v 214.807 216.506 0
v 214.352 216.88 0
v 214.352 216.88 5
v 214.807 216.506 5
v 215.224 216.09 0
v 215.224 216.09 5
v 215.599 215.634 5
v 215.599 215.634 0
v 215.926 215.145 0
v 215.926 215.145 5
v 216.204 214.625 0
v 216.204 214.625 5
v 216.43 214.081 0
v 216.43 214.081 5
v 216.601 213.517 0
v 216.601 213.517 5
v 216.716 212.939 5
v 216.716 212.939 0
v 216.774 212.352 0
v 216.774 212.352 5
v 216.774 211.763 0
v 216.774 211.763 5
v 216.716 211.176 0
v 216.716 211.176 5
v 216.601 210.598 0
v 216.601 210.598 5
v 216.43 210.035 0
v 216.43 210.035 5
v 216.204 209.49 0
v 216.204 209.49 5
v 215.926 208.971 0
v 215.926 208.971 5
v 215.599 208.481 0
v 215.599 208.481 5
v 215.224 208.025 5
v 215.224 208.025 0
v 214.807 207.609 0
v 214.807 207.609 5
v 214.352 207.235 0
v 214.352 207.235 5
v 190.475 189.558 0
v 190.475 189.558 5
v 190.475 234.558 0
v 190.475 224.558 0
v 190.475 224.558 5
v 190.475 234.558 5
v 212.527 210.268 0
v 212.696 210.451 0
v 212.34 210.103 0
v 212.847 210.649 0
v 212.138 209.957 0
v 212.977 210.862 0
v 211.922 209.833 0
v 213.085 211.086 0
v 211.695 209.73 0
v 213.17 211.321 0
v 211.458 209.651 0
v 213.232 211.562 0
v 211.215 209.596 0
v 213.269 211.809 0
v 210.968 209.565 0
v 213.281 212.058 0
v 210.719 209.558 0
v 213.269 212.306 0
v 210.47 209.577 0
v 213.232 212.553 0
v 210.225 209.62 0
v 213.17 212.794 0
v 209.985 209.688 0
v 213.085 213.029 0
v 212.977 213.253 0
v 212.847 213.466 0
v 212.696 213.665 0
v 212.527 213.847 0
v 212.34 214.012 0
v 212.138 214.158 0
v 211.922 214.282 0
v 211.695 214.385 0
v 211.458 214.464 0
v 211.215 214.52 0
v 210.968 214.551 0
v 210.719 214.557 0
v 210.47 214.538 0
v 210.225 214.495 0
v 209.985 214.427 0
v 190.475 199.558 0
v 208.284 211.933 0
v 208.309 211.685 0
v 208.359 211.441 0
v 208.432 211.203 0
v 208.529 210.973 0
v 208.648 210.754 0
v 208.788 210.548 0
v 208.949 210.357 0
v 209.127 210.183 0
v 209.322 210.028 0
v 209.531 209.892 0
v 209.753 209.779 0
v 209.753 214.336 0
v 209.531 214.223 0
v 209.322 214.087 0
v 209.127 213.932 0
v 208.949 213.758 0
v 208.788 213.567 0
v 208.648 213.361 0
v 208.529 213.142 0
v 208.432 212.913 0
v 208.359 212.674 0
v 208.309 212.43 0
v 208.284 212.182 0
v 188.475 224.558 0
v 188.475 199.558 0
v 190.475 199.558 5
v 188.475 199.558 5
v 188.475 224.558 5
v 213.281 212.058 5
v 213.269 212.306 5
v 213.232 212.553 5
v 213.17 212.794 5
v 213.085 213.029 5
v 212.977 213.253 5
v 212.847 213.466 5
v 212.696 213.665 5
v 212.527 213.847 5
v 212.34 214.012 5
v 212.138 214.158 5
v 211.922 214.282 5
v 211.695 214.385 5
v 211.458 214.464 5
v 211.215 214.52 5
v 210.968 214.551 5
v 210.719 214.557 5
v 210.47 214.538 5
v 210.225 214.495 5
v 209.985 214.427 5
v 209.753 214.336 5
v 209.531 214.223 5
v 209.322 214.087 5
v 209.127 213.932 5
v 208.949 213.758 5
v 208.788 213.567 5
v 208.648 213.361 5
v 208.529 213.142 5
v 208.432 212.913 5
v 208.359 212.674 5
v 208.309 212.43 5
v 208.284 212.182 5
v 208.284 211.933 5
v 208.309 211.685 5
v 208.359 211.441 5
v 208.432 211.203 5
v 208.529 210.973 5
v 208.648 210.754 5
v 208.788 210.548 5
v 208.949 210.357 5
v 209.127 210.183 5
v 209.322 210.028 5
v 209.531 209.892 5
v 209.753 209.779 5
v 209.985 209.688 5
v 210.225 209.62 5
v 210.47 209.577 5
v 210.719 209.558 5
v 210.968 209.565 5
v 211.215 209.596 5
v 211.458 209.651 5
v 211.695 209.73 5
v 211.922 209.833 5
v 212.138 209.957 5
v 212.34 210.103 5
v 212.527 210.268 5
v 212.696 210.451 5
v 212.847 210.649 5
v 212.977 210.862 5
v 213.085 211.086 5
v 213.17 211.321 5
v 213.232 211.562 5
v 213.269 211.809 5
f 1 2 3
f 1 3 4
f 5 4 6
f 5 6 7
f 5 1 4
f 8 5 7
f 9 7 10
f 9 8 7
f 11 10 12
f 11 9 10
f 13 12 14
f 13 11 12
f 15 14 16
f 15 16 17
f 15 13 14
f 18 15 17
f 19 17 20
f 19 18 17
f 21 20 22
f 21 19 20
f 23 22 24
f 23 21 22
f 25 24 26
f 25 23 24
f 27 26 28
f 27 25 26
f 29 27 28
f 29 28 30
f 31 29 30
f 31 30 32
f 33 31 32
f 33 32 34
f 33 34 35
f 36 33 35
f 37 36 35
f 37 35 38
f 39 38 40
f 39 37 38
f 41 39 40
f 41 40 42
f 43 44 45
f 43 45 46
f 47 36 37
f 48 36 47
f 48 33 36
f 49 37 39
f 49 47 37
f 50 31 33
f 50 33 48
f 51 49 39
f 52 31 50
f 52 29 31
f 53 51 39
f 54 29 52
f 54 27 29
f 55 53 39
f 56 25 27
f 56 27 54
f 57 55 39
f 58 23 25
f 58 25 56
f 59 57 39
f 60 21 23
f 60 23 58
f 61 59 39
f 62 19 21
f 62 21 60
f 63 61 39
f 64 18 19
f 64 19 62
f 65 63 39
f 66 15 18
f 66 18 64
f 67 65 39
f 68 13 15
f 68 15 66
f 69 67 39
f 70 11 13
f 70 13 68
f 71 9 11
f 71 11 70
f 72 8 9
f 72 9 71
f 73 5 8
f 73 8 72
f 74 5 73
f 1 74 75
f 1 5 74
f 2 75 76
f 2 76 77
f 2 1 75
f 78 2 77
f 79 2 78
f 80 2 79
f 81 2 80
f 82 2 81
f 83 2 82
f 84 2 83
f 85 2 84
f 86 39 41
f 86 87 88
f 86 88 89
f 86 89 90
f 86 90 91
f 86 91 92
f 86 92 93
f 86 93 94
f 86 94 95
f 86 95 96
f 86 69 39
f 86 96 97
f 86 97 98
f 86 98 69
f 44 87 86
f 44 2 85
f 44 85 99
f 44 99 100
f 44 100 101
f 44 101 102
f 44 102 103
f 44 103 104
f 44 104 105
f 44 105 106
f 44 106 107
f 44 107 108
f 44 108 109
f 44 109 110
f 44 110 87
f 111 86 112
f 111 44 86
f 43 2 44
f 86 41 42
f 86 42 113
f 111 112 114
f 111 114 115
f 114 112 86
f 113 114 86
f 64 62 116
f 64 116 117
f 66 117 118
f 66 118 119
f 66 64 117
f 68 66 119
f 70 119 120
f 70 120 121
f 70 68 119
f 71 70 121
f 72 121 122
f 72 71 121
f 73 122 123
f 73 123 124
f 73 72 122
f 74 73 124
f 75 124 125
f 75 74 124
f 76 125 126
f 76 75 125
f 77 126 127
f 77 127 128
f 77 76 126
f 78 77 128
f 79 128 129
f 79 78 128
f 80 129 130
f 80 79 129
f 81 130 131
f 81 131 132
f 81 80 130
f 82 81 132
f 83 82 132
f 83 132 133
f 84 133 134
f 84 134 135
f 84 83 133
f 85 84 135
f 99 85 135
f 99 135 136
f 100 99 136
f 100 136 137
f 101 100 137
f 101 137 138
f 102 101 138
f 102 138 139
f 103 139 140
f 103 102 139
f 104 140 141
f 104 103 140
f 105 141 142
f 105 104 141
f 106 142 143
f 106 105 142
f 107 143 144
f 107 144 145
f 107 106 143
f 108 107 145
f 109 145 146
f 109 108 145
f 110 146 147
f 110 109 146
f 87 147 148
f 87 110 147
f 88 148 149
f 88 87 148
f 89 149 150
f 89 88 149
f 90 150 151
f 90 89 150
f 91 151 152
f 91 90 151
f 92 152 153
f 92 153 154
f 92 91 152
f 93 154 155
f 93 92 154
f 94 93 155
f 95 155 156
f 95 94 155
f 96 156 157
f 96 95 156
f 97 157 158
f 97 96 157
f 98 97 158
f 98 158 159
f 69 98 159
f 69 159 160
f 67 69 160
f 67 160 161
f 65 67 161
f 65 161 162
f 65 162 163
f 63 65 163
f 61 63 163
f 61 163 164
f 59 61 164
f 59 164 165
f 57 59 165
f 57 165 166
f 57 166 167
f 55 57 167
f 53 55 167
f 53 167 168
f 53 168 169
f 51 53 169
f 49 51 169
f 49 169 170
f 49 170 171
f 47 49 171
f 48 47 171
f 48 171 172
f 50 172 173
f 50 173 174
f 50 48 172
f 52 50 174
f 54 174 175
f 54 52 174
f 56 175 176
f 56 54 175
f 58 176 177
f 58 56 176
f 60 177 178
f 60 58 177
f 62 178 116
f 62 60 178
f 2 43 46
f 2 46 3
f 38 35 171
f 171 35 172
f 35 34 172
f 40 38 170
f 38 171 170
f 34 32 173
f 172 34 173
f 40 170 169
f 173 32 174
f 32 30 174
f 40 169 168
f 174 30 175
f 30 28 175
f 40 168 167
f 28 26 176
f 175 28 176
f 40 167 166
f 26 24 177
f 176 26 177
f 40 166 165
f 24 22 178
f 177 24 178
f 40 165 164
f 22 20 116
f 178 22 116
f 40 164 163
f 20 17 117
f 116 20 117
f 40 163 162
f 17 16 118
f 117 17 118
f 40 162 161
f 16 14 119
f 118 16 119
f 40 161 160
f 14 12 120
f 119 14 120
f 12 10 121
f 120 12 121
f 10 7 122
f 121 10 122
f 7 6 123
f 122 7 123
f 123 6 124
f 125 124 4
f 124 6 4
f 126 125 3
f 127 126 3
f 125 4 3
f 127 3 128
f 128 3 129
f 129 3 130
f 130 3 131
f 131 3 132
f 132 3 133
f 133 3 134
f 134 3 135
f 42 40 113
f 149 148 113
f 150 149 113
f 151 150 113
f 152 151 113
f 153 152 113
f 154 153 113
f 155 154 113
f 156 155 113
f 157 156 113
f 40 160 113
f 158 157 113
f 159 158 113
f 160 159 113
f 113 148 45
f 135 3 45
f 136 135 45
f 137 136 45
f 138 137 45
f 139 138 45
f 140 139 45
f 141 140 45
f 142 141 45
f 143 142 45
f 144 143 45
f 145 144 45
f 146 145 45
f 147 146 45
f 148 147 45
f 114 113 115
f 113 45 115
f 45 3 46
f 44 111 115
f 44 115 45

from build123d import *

# Parameters (mm, degrees)
SZKIC1_R                    = 2.5
SZKIC1_W                    = 2
SZKIC1_H                    = 25
DODANIE_WYCI_GNI_CIE1_DEPTH = 5


with BuildPart() as part:
    # Szkic1 → Dodanie-wyciągnięcie1 (new body)
    with BuildSketch(Plane.XY):
        with BuildLine():
            ThreePointArc((214.351594971, 216.879691308), (216.781303051, 212.057553235), (214.351594971, 207.235415161))
            Line((214.351594971, 207.235415161), (190.475370577, 189.557553235))
            Line((190.475370577, 189.557553235), (190.475370577, 199.557553235))
            Line((190.475370577, 199.557553235), (190.475370577, 224.557553235))
            Line((190.475370577, 224.557553235), (190.475370577, 234.557553235))
            Line((190.475370577, 234.557553235), (214.351594971, 216.879691308))
        make_face()
        with Locations((210.781303051, 212.057553235)):
            Circle(SZKIC1_R, mode=Mode.SUBTRACT)
        with Locations((189.475370577, 212.057553235)):
            Rectangle(SZKIC1_W, SZKIC1_H)
    extrude(amount=DODANIE_WYCI_GNI_CIE1_DEPTH)


solid = part.part
